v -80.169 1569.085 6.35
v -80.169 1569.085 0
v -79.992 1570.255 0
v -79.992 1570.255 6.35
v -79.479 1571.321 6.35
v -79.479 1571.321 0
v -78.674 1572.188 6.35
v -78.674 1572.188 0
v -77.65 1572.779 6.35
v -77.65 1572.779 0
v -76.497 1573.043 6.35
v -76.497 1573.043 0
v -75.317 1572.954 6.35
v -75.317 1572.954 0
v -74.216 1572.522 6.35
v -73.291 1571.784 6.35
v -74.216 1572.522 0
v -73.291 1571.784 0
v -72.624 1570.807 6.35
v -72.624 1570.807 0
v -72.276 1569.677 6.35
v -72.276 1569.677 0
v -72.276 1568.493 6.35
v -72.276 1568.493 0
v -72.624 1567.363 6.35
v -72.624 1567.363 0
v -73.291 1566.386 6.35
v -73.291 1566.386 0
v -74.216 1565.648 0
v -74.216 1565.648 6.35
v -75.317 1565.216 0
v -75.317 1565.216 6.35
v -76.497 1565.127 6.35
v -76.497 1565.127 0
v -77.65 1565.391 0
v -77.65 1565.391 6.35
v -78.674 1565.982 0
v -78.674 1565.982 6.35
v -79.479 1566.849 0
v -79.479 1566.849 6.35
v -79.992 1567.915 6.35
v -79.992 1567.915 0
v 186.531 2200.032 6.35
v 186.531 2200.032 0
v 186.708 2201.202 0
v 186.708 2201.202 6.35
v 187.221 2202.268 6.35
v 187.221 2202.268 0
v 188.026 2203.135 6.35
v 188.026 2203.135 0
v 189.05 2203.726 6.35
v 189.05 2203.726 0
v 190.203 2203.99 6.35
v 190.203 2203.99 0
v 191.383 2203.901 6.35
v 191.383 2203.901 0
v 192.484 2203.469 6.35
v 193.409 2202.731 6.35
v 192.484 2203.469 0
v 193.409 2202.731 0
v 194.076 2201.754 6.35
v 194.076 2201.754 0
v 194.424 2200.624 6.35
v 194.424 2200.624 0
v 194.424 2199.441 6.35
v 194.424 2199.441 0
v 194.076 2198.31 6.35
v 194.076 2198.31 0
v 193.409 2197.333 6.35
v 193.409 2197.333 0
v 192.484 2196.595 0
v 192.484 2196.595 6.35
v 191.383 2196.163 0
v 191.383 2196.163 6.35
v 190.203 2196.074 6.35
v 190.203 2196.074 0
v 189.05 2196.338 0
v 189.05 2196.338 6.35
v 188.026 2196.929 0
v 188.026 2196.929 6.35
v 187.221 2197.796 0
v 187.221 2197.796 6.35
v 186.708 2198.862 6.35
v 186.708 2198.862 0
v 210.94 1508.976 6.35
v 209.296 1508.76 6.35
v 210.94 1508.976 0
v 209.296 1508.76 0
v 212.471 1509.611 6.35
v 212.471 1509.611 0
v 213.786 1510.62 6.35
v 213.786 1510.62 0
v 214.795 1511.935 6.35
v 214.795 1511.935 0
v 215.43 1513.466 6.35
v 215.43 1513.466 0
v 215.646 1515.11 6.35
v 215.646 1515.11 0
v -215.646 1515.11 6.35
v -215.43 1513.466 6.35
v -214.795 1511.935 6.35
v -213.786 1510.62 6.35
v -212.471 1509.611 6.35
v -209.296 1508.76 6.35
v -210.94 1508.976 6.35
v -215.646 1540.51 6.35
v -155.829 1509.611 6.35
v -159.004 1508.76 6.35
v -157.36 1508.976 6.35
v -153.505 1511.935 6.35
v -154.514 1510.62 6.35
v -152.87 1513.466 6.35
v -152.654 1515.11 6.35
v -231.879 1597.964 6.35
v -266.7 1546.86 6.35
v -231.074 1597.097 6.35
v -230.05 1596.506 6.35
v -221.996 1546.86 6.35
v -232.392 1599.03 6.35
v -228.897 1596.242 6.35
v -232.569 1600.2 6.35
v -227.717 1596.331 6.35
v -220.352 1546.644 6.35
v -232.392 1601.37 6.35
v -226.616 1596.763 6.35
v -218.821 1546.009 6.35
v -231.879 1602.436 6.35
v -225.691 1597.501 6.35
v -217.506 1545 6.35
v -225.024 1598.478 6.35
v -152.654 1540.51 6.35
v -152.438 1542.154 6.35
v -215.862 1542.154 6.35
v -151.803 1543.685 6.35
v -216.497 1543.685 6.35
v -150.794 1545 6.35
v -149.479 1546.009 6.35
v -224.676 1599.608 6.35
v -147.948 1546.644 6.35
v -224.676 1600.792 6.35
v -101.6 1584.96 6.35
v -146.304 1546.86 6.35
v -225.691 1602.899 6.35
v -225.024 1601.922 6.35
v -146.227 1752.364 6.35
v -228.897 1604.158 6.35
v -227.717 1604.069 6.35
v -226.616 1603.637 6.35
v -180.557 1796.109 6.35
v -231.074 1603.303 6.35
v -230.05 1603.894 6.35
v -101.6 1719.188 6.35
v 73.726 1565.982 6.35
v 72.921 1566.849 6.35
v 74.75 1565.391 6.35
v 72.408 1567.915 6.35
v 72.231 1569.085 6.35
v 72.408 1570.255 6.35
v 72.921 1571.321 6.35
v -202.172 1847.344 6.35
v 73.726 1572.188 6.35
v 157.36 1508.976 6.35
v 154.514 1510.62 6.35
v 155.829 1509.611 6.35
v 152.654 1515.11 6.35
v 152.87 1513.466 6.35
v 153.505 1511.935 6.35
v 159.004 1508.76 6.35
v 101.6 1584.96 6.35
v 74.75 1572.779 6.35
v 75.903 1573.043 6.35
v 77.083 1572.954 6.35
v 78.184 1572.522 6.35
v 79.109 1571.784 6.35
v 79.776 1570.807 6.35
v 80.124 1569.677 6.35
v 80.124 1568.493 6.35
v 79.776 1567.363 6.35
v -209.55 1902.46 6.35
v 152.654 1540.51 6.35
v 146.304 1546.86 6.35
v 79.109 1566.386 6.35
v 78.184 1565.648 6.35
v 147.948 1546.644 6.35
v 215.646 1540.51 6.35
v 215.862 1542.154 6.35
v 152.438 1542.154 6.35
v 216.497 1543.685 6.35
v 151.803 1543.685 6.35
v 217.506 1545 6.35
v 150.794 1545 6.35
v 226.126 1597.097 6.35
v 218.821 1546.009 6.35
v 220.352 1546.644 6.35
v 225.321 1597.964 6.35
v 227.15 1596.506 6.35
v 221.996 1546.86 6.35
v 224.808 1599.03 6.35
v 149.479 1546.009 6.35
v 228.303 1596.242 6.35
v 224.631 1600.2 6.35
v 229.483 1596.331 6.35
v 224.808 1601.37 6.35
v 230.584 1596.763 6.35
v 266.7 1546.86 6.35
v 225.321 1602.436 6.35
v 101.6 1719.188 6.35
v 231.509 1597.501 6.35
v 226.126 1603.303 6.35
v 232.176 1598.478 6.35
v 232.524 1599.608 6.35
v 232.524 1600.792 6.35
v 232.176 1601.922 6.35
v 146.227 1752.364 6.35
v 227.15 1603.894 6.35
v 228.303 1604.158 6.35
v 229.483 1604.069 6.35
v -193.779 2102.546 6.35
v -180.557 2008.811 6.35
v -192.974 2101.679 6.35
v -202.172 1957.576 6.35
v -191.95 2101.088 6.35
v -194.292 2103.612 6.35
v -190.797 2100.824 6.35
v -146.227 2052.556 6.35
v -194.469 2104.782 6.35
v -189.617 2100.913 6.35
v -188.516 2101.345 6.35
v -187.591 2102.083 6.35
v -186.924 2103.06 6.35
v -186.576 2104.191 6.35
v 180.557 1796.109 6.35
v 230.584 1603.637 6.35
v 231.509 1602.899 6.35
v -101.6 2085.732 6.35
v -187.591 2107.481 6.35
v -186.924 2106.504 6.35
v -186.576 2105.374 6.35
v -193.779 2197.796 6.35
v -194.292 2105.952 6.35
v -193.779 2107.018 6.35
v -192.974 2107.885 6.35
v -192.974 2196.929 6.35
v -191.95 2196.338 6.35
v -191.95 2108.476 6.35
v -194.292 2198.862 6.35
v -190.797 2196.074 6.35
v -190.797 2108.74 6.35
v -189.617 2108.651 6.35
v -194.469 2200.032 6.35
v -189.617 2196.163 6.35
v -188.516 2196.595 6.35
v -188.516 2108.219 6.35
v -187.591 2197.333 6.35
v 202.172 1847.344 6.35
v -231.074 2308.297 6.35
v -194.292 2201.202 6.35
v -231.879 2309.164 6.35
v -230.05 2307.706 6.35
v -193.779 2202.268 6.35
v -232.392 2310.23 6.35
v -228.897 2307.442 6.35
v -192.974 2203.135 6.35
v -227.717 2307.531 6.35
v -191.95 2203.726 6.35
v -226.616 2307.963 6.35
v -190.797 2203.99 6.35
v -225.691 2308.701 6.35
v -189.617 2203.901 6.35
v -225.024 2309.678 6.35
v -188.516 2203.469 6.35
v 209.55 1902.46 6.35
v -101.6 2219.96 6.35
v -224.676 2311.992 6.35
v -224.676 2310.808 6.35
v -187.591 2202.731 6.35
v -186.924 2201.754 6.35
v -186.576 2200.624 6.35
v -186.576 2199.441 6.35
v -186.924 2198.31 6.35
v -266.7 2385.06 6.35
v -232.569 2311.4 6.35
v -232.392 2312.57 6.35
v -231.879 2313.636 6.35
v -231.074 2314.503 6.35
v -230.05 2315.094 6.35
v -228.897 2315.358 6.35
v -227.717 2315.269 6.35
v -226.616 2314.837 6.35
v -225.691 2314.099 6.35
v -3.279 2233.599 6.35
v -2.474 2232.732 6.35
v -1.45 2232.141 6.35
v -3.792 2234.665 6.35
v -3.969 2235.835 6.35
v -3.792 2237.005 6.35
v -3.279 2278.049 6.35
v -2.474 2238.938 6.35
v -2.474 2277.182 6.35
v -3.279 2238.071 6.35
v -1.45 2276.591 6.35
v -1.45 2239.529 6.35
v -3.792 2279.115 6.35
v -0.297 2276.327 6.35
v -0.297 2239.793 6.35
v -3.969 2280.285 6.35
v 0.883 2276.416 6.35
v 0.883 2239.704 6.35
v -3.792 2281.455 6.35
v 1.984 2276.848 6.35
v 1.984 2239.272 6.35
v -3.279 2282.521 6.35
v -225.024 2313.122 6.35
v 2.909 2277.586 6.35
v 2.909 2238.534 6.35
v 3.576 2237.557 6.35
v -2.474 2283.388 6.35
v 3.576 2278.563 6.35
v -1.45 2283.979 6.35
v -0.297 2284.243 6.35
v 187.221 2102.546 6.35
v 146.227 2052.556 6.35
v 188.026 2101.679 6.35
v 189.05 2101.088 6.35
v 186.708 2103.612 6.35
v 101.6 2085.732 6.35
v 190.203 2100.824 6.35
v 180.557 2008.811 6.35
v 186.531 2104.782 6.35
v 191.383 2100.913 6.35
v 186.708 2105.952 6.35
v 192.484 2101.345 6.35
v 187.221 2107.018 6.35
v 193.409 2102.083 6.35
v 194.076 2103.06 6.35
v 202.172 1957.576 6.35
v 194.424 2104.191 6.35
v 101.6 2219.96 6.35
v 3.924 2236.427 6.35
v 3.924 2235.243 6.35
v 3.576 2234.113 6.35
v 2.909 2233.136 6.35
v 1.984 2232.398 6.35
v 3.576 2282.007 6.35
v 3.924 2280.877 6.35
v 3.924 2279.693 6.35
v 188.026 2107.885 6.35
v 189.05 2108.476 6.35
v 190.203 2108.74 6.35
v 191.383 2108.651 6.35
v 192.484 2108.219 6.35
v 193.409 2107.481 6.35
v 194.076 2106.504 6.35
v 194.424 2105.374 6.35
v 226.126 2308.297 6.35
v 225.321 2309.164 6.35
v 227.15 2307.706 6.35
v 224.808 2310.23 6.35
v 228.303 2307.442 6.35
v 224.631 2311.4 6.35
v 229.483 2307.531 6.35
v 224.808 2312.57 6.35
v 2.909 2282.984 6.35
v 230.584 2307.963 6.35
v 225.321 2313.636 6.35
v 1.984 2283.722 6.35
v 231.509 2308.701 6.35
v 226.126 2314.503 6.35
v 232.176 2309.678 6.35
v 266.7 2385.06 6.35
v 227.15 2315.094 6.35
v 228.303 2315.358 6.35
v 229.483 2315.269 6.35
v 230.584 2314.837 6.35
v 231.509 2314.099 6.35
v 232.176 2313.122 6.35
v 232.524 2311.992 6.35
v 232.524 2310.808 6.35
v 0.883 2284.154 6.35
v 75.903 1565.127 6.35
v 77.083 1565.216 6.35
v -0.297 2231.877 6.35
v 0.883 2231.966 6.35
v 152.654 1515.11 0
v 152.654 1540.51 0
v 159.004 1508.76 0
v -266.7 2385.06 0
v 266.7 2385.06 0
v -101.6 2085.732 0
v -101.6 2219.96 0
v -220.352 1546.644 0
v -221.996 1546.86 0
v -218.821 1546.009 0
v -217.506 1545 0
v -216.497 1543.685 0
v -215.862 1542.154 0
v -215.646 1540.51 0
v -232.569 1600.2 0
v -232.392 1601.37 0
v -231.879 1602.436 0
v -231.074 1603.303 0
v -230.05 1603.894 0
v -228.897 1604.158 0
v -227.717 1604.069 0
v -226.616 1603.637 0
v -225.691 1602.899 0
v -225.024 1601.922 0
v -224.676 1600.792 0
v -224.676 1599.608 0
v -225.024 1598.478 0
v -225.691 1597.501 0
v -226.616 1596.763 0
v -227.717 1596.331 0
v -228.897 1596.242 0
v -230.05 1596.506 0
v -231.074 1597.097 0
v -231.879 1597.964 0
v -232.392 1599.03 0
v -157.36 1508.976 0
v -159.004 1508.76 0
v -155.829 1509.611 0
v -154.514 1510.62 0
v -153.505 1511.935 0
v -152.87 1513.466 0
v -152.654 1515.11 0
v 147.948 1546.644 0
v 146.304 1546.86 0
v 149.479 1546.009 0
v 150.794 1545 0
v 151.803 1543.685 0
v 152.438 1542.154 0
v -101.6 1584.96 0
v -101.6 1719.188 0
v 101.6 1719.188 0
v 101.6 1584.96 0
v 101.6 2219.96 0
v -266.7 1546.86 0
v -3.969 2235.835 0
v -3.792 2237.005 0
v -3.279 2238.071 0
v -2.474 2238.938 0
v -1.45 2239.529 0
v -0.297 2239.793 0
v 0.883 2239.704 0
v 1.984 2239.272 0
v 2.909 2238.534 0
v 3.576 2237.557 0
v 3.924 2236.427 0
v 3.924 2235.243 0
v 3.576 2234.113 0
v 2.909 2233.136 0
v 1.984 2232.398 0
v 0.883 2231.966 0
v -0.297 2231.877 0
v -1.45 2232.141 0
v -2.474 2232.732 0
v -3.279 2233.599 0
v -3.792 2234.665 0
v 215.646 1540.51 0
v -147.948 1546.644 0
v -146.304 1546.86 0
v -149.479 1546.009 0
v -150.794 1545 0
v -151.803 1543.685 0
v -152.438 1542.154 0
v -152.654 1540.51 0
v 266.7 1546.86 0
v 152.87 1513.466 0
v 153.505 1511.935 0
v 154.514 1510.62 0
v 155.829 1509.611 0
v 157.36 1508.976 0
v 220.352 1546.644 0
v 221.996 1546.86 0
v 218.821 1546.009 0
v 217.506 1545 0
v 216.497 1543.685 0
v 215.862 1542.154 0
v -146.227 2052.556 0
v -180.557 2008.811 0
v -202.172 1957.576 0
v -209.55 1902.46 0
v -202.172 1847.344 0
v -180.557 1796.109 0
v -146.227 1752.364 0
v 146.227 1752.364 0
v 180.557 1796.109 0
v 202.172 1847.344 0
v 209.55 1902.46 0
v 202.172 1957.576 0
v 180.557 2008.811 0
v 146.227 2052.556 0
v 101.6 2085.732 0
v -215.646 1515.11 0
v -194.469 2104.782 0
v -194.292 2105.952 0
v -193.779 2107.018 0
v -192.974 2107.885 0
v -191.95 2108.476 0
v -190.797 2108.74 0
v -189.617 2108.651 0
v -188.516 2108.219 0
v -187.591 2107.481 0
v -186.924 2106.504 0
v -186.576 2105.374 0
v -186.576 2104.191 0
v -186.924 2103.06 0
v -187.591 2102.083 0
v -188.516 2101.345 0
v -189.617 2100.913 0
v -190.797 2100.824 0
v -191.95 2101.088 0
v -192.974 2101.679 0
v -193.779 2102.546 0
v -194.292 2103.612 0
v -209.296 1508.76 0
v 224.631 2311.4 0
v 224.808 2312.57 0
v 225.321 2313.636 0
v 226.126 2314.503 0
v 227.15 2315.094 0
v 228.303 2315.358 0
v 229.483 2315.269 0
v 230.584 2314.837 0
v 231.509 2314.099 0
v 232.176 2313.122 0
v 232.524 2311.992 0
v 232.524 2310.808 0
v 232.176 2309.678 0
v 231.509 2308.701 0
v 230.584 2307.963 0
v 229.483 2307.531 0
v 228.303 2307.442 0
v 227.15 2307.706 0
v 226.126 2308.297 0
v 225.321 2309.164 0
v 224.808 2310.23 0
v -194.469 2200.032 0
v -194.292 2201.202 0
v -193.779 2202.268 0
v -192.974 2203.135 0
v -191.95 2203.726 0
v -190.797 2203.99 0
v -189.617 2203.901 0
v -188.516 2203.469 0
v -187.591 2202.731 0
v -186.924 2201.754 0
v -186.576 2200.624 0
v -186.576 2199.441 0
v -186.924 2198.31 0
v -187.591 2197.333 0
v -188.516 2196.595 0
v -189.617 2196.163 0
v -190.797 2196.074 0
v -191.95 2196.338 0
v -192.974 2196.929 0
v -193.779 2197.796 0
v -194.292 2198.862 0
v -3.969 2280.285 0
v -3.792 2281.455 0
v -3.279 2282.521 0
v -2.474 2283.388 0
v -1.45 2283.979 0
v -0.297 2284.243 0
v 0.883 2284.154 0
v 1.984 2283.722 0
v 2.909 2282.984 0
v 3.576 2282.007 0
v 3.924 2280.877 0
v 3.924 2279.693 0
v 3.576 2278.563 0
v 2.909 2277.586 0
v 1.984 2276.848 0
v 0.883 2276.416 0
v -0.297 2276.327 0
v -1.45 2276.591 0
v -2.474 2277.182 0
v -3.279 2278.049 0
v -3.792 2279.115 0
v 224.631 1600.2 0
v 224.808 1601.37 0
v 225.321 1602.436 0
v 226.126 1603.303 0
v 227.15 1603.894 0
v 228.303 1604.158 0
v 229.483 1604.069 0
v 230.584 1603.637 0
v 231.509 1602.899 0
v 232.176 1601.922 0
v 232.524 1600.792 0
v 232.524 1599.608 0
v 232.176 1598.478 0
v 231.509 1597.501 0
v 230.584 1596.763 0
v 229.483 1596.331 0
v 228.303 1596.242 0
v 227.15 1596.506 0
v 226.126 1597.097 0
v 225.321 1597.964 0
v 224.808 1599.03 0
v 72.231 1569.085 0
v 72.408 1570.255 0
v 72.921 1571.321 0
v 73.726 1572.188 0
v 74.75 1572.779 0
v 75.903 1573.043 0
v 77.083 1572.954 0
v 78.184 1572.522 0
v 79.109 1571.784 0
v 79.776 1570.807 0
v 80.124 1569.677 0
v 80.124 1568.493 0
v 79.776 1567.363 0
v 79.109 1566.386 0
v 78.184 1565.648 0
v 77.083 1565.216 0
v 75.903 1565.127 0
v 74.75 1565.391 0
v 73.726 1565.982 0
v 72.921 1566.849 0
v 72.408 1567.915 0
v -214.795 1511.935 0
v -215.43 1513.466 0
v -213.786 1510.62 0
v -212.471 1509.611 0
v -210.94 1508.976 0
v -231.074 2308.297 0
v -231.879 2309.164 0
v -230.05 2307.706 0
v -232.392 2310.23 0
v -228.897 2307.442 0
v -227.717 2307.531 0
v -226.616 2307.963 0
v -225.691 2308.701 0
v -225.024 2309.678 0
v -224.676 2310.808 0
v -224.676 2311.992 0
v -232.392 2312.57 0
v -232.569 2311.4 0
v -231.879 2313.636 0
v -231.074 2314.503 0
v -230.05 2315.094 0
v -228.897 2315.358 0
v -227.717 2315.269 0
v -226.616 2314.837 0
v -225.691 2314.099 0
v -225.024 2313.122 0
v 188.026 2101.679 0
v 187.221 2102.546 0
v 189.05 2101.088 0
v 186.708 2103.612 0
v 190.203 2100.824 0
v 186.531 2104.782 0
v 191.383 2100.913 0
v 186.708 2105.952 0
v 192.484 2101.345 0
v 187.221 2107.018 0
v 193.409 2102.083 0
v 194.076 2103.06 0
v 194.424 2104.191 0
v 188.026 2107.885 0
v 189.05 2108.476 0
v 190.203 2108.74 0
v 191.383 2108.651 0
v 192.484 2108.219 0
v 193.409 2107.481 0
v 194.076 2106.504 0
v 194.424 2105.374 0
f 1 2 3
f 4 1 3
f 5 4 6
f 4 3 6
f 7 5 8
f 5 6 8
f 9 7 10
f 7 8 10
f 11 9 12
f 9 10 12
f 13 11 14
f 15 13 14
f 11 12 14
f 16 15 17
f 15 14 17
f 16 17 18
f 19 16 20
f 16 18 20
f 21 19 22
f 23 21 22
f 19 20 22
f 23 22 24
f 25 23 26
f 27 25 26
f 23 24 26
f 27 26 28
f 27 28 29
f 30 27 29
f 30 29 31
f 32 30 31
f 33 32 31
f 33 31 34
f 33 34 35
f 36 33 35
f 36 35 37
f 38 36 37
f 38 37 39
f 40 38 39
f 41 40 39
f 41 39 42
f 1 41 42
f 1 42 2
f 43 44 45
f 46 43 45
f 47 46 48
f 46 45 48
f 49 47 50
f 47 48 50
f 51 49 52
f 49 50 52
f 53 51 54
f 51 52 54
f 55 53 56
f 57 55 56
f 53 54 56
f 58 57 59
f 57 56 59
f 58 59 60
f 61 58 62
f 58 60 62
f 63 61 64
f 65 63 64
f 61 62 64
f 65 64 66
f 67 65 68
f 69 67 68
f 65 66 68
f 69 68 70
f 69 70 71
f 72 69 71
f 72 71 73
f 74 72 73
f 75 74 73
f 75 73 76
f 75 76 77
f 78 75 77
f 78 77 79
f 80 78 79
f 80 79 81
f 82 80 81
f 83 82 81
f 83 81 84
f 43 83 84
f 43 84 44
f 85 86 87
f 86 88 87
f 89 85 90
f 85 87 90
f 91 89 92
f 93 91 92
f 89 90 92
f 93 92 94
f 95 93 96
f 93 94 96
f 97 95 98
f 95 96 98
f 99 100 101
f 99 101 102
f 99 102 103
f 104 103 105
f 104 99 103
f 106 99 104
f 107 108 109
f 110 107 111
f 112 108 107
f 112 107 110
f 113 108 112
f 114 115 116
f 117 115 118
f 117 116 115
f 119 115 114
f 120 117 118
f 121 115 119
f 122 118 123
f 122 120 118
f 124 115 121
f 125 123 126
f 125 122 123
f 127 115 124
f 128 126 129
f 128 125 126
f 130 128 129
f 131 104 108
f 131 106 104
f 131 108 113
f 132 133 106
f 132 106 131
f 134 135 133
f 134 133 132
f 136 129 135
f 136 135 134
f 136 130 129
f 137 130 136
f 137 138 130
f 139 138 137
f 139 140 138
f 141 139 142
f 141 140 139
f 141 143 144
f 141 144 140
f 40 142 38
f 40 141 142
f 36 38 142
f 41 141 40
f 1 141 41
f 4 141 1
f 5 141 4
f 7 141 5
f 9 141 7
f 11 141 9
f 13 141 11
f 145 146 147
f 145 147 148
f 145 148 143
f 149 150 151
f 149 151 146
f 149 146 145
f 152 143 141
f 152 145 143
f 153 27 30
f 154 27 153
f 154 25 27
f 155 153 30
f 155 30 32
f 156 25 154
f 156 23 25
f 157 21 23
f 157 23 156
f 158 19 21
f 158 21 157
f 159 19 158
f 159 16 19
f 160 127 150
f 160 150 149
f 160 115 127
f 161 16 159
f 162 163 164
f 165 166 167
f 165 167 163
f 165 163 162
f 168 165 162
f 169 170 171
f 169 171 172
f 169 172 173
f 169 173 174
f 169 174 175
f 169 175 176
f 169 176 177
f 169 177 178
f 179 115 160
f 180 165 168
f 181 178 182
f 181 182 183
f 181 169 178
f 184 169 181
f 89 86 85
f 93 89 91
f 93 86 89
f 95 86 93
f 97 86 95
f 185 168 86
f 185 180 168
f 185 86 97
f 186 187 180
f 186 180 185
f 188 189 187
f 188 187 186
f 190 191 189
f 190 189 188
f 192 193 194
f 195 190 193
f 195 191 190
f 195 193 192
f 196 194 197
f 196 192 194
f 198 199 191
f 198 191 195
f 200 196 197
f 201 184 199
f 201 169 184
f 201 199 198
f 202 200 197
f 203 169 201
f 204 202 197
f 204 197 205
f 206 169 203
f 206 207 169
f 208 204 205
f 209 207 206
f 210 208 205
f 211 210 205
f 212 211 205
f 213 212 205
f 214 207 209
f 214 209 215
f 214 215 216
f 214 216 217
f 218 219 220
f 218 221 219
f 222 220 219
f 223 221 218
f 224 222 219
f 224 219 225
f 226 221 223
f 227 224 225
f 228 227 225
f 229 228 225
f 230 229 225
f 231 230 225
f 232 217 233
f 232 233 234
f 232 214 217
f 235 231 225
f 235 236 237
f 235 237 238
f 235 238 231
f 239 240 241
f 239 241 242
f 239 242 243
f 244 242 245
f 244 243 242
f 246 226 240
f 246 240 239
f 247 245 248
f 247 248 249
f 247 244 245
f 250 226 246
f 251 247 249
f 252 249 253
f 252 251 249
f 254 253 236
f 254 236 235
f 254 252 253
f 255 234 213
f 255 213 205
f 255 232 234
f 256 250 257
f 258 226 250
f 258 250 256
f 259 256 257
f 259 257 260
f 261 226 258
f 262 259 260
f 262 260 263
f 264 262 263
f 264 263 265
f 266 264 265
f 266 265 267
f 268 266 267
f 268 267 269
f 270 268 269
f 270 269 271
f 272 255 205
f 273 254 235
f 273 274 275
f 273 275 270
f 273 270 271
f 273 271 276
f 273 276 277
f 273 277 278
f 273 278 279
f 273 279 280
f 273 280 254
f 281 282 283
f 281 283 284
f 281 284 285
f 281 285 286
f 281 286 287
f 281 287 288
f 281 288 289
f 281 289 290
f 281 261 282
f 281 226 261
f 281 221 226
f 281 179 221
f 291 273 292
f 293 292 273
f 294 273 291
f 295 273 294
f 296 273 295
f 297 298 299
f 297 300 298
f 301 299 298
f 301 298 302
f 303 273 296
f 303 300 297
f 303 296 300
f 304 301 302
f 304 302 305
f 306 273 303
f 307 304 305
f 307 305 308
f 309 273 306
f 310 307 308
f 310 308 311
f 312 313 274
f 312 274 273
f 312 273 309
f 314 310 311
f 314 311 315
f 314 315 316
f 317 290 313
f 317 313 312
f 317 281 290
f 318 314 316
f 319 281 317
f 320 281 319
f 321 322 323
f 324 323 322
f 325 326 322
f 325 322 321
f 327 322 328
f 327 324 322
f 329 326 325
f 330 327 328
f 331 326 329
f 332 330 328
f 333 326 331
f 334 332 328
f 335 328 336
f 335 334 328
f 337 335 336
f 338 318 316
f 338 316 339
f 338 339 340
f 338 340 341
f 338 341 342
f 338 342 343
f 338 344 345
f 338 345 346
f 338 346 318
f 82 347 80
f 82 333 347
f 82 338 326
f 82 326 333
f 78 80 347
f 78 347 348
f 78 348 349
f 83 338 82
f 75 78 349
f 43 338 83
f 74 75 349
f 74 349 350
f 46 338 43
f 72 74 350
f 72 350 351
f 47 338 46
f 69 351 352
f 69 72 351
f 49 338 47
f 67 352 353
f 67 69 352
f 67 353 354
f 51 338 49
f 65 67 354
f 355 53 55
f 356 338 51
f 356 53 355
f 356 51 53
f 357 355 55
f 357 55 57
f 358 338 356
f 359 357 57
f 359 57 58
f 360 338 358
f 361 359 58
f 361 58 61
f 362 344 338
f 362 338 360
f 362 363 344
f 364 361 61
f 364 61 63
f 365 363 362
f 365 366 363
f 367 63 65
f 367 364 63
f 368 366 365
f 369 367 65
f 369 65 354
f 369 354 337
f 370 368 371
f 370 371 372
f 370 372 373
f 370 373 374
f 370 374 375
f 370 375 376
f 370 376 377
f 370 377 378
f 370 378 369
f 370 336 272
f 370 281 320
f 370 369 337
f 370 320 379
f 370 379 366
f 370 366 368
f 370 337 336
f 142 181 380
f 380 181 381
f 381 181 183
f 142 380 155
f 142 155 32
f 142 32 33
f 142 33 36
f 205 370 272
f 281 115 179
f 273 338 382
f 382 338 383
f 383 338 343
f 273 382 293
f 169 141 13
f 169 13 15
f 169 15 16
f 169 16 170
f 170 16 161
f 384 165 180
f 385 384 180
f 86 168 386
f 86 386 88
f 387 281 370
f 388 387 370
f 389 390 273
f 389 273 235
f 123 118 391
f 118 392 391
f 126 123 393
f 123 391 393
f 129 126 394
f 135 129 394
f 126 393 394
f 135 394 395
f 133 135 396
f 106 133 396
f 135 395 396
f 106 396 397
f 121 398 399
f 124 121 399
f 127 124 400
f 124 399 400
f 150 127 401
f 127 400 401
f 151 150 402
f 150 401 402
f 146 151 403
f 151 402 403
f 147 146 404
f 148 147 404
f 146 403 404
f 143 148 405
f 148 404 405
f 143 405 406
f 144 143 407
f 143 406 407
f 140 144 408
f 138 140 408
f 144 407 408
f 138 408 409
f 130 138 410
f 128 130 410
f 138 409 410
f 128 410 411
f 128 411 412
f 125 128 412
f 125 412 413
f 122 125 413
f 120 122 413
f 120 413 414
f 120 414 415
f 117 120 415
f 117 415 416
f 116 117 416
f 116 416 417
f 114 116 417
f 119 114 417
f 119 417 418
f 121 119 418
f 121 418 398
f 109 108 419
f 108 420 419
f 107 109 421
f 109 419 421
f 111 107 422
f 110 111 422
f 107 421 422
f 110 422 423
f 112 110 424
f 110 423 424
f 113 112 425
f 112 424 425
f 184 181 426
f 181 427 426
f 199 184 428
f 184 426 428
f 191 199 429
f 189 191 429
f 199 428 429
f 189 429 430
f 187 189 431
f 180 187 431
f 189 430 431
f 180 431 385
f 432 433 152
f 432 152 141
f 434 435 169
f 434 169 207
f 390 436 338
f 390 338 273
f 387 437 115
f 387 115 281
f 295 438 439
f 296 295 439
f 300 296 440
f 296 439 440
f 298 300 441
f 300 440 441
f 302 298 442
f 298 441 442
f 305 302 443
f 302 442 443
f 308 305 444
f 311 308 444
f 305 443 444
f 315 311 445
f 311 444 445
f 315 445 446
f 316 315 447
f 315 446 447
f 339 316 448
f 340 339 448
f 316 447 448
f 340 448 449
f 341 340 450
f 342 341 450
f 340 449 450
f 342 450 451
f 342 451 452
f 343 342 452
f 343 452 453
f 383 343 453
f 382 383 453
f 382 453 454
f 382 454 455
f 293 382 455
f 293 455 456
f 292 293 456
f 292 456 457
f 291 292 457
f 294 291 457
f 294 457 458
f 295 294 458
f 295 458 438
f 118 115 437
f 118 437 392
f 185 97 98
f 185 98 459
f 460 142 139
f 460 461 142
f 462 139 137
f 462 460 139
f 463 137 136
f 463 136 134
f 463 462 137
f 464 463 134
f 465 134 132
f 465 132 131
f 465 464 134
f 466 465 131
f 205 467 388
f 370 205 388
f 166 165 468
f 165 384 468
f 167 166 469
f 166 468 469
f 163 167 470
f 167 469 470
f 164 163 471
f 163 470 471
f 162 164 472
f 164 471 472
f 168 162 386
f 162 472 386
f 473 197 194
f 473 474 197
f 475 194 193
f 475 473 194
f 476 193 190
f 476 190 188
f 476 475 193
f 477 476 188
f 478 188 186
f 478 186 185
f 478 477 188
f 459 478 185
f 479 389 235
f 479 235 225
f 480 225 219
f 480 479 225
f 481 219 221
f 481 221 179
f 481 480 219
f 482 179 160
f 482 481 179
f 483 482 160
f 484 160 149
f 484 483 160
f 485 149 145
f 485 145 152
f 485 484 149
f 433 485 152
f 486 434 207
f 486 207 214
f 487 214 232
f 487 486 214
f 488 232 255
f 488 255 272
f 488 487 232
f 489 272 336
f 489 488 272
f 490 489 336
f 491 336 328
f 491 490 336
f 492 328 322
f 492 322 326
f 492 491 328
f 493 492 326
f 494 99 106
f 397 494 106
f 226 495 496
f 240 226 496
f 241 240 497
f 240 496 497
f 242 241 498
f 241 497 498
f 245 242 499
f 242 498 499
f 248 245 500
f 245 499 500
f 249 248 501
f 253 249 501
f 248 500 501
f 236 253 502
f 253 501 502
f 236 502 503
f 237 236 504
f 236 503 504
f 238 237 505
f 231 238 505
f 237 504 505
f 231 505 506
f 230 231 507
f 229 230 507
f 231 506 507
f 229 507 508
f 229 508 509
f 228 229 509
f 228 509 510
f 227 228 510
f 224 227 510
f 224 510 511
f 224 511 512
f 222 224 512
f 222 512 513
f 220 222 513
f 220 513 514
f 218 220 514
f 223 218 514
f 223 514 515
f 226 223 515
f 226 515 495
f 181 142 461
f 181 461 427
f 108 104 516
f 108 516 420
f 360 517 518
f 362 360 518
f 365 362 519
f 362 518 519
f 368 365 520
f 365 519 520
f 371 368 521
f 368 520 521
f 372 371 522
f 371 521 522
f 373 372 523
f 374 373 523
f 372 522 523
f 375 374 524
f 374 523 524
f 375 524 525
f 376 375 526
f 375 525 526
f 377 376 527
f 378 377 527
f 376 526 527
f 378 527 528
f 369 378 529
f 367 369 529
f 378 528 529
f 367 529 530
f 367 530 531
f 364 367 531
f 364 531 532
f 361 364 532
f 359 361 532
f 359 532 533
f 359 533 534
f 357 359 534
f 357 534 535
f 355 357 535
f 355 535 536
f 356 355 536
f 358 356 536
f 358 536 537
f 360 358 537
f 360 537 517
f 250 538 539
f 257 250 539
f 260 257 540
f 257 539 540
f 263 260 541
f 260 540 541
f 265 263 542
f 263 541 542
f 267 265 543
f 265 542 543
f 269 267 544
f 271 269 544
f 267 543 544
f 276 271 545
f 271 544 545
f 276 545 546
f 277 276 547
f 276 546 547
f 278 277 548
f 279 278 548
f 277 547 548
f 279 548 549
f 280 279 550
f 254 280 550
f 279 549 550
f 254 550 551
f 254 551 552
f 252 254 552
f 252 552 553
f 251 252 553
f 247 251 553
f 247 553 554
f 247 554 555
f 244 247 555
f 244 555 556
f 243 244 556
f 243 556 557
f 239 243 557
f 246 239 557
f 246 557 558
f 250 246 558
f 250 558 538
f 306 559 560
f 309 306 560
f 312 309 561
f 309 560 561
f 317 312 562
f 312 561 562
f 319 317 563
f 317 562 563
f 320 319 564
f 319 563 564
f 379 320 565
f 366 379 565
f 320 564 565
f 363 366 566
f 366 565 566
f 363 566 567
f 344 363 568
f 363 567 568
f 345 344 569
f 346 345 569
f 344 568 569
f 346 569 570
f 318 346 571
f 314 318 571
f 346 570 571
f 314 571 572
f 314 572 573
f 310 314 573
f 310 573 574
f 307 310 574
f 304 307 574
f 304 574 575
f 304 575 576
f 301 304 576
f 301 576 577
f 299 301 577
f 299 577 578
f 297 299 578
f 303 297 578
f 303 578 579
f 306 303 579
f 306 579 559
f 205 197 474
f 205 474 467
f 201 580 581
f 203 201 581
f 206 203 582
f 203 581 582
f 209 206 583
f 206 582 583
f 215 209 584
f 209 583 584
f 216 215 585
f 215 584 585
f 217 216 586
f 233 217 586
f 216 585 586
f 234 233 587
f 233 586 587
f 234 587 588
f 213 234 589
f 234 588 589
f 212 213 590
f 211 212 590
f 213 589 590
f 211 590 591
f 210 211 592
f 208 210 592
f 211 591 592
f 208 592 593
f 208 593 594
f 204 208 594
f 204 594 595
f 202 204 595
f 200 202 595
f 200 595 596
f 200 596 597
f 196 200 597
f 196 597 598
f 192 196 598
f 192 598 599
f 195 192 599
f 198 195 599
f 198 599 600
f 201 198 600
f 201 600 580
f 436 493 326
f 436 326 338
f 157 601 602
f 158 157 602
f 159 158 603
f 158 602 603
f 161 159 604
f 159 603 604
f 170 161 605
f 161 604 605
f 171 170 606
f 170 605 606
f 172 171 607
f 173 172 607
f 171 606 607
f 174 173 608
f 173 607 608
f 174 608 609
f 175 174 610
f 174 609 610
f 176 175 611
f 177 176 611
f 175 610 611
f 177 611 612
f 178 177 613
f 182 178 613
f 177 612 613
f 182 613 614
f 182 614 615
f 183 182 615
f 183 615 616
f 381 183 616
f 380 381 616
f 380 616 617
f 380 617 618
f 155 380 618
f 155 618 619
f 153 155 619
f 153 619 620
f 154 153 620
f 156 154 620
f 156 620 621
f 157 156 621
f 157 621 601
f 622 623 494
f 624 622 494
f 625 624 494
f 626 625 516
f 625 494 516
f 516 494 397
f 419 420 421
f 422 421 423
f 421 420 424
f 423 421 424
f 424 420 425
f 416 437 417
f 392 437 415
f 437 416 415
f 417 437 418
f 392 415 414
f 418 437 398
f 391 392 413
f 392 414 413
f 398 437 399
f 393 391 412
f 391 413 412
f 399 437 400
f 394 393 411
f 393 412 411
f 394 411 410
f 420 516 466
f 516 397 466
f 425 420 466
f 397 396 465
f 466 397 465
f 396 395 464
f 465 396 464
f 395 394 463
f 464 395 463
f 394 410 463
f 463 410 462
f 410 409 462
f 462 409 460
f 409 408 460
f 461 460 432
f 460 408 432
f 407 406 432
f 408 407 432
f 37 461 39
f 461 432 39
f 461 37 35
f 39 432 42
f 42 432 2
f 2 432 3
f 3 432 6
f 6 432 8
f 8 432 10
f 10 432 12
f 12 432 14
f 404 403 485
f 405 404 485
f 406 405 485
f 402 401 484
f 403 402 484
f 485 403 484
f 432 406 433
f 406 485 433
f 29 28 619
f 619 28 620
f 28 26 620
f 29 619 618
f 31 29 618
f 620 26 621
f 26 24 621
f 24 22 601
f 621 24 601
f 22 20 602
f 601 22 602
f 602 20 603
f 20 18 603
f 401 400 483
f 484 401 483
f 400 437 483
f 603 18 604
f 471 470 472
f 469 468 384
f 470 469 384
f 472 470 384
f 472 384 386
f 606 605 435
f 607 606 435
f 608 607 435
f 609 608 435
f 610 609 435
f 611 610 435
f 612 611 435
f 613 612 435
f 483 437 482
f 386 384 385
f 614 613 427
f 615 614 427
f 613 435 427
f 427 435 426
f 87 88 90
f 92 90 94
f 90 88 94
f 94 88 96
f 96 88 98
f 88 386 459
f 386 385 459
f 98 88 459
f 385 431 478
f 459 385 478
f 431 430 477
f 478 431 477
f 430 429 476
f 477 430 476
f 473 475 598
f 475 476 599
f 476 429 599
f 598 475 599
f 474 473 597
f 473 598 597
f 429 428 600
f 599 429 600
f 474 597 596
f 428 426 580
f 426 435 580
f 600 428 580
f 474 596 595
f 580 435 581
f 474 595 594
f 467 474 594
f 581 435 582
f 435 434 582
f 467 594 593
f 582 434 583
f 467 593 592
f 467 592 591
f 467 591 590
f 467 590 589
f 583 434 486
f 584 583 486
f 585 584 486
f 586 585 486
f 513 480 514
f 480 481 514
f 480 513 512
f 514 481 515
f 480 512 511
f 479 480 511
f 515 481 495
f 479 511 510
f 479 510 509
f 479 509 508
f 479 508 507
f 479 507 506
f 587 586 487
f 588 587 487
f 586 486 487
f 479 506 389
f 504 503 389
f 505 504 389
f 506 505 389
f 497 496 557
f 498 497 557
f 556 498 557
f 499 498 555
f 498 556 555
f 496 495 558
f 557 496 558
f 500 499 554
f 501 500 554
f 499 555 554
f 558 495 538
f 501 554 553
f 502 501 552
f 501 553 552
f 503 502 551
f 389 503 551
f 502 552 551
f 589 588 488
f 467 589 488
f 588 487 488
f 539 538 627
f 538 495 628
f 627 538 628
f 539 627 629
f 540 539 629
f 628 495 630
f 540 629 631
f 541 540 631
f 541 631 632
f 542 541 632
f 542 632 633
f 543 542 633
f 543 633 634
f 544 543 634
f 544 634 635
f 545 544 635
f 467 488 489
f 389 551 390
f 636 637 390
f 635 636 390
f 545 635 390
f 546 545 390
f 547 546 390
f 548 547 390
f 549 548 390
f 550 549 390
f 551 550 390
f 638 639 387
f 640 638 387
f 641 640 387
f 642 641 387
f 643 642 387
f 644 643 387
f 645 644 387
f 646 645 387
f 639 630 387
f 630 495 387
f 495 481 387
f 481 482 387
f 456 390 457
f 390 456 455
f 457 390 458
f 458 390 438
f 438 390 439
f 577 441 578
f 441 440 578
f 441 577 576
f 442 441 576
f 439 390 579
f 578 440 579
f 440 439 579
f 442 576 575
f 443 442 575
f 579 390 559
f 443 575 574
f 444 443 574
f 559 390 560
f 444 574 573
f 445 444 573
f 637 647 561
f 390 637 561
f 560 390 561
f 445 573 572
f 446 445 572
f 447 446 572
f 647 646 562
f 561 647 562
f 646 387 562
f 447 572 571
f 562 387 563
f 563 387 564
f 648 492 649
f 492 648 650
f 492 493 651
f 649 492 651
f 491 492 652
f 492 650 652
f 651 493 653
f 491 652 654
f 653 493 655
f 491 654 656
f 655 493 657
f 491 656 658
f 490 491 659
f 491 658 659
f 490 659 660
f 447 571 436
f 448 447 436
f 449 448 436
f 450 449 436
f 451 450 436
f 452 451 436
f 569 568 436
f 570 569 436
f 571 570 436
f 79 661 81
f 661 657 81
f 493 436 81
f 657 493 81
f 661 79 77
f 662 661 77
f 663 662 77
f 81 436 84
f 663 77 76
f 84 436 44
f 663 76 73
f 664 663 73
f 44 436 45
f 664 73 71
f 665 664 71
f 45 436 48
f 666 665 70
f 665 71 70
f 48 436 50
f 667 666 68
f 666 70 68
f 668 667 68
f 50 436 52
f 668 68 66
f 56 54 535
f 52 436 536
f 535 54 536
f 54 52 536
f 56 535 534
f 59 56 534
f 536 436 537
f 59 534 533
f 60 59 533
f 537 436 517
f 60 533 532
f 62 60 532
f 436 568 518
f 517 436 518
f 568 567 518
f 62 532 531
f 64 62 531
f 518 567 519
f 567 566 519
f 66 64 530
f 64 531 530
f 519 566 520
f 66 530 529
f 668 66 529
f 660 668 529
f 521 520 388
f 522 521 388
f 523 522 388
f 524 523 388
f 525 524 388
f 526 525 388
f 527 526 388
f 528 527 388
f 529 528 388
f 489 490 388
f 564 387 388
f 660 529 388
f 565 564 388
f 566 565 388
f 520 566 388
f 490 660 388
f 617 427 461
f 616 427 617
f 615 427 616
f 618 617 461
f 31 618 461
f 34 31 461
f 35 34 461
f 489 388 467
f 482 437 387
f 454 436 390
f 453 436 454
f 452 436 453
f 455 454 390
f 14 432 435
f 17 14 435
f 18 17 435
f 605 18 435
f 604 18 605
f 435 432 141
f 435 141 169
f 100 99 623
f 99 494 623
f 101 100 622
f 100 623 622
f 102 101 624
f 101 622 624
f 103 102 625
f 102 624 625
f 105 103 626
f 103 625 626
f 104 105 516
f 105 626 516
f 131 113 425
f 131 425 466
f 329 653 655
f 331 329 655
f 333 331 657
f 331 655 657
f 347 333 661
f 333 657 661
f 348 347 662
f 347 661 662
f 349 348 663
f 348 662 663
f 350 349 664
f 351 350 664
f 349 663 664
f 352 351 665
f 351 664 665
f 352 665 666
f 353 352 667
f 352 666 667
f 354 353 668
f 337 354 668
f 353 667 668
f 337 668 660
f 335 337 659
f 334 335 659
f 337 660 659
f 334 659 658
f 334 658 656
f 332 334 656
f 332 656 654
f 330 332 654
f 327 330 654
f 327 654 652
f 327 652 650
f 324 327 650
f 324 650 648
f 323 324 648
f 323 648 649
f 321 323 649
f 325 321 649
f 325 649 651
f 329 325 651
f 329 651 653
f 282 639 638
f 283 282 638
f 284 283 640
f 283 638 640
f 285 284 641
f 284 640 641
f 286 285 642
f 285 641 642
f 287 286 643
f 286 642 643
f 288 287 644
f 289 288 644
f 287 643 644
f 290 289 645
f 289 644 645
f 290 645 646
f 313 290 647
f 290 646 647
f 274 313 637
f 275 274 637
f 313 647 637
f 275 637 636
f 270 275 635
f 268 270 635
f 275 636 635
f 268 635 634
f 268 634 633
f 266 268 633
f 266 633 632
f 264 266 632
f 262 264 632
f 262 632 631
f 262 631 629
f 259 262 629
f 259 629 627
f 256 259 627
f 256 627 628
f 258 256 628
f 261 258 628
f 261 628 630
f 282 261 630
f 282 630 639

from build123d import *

# Parameters (mm, degrees)
SKETCH1_W                      = 533.4
SKETCH1_H                      = 2413
BOSS_EXTRUDE1_DEPTH            = 6.35
F_5_16_0_3125_DIAMETER_HOLE1_D = 7.9375
SKETCH6_W                      = 533.4
SKETCH6_H                      = 1546.86
CUT_EXTRUDE1_DEPTH             = 7.35
SKETCH7_W                      = 62.992
SKETCH7_H                      = 38.1
BOSS_EXTRUDE2_DEPTH            = 6.35
FILLET1_R                      = 6.35
SKETCH9_W                      = 533.4
SKETCH9_H                      = 27.94
CUT_EXTRUDE3_DEPTH             = 7.35
F_5_16_0_3125_DIAMETER_HOLE2_D = 7.9375


with BuildPart() as part:
    # Sketch1 → Boss-Extrude1 (new body)
    with BuildSketch(Plane.XY):
        with Locations((0, 1206.5)):
            Rectangle(SKETCH1_W, SKETCH1_H)
        with BuildLine():
            Line((-101.6, 797.56), (101.6, 797.56))
            Line((101.6, 797.56), (101.6, 663.332045059))
            ThreePointArc((101.6, 663.332045059), (209.55, 480.06), (101.6, 296.787954941))
            Line((101.6, 296.787954941), (101.6, 162.56))
            Line((101.6, 162.56), (-101.6, 162.56))
            Line((-101.6, 162.56), (-101.6, 296.787954941))
            ThreePointArc((-101.6, 296.787954941), (-209.55, 480.06), (-101.6, 663.332045059))
            Line((-101.6, 663.332045059), (-101.6, 797.56))
        make_face(mode=Mode.SUBTRACT)
        with BuildLine():
            Line((-101.6, 1508.76), (-101.6, 1374.532045059))
            ThreePointArc((-101.6, 1374.532045059), (-209.55, 1191.26), (-101.6, 1007.987954941))
            Line((-101.6, 1007.987954941), (-101.6, 873.76))
            Line((-101.6, 873.76), (101.6, 873.76))
            Line((101.6, 873.76), (101.6, 1007.987954941))
            ThreePointArc((101.6, 1007.987954941), (209.55, 1191.26), (101.6, 1374.532045059))
            Line((101.6, 1374.532045059), (101.6, 1508.76))
            Line((101.6, 1508.76), (-101.6, 1508.76))
        make_face(mode=Mode.SUBTRACT)
        with BuildLine():
            Line((-101.6, 2219.96), (-101.6, 2085.732045059))
            ThreePointArc((-101.6, 2085.732045059), (-209.55, 1902.46), (-101.6, 1719.187954941))
            Line((-101.6, 1719.187954941), (-101.6, 1584.96))
            Line((-101.6, 1584.96), (101.6, 1584.96))
            Line((101.6, 1584.96), (101.6, 1719.187954941))
            ThreePointArc((101.6, 1719.187954941), (209.55, 1902.46), (101.6, 2085.732045059))
            Line((101.6, 2085.732045059), (101.6, 2219.96))
            Line((101.6, 2219.96), (-101.6, 2219.96))
        make_face(mode=Mode.SUBTRACT)
    extrude(amount=BOSS_EXTRUDE1_DEPTH)

    # 5/16 (0.3125) Diameter Hole1 (through all)
    with Locations(Plane.XY.offset(6.35)):
        with Locations((-76.2, 146.685), (-76.2, 102.235), (-228.6, 177.8), (76.2, 102.235), (76.2, 146.685), (-76.2, 857.885), (-76.2, 813.435), (76.2, 813.435), (76.2, 857.885), (-76.2, 1569.085), (-76.2, 1524.635), (76.2, 1524.635), (76.2, 1569.085), (228.6, 177.8), (-228.6, 889), (228.6, 889), (-228.6, 1600.2), (228.6, 1600.2), (0, 2280.285), (0, 2235.835), (228.6, 2311.4), (-228.6, 2311.4)):
            Hole(F_5_16_0_3125_DIAMETER_HOLE1_D / 2)

    # Sketch6 → Cut-Extrude1 (cut, through all)
    with BuildSketch(Plane.XY.offset(6.35)):
        with Locations((0, 773.43)):
            Rectangle(SKETCH6_W, SKETCH6_H)
    extrude(amount=-CUT_EXTRUDE1_DEPTH, mode=Mode.SUBTRACT)

    # Sketch7 → Boss-Extrude2 (add)
    with BuildSketch(Plane.XY.offset(6.35)):
        with Locations((-184.15, 1527.81)):
            Rectangle(SKETCH7_W, SKETCH7_H)
        with Locations((184.15, 1527.81)):
            Rectangle(SKETCH7_W, SKETCH7_H)
    extrude(amount=-BOSS_EXTRUDE2_DEPTH)

    # Fillet1
    fillet1_edges = [part.edges().sort_by_distance(p)[0] for p in [
        (-152.654, 1508.76, 3.175),
        (-215.646, 1508.76, 3.175),
        (-215.646, 1546.86, 3.175),
        (-152.654, 1546.86, 3.175),
        (215.646, 1508.76, 3.175),
        (215.646, 1546.86, 3.175),
        (152.654, 1546.86, 3.175),
        (152.654, 1508.76, 3.175),
    ]]
    fillet(fillet1_edges, radius=FILLET1_R)

    # Sketch9 → Cut-Extrude3 (cut, through all)
    with BuildSketch(Plane.XY.offset(6.35)):
        with Locations((0, 2399.03)):
            Rectangle(SKETCH9_W, SKETCH9_H)
    extrude(amount=-CUT_EXTRUDE3_DEPTH, mode=Mode.SUBTRACT)

    # 5/16 (0.3125) Diameter Hole2 (through all)
    with Locations(Plane.XY.offset(6.35)):
        with Locations((-190.5, 2200.032045059), (-190.5, 2104.782045059), (190.5, 2200.032045059), (190.5, 2104.782045059)):
            Hole(F_5_16_0_3125_DIAMETER_HOLE2_D / 2)


solid = part.part
